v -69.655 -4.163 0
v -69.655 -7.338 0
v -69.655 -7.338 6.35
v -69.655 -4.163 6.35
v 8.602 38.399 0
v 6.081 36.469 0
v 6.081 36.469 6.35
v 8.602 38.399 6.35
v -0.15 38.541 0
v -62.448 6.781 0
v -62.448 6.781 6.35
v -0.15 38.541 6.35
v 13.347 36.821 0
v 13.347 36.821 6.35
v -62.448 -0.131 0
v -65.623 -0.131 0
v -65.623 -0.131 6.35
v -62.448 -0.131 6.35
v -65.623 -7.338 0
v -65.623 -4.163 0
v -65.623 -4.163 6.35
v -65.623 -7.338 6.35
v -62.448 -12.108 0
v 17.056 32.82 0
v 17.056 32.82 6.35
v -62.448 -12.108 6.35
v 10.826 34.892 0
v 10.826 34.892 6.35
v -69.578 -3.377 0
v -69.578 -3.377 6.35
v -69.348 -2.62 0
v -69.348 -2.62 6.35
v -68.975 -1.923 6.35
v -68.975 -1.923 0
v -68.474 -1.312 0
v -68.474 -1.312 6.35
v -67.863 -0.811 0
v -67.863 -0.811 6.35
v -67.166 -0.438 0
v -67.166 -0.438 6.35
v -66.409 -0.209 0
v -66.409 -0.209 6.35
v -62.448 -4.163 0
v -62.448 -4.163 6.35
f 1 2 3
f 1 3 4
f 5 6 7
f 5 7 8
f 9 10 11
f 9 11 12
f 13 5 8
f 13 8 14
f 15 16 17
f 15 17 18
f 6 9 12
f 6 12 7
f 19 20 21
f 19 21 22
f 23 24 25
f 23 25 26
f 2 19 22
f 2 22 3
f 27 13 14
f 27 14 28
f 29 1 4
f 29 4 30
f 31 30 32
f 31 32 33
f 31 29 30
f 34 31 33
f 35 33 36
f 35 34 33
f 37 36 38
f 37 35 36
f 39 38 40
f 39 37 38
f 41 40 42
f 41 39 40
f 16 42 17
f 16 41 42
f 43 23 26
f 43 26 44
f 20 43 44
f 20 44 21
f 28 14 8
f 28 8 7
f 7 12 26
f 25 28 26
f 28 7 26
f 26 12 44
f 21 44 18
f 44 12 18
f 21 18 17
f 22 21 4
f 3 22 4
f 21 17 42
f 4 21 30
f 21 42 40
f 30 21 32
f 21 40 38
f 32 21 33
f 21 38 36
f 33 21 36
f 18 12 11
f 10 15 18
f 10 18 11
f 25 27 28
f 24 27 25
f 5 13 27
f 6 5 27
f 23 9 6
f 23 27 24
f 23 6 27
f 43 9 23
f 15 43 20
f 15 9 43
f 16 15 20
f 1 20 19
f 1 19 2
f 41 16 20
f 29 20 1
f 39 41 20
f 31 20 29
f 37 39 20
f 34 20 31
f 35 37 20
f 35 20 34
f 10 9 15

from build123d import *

# Parameters (mm, degrees)
BOSS_EXTRUDE1_DEPTH = 6.35


with BuildPart() as part:
    # Sketch2 → Boss-Extrude1 (new body)
    with BuildSketch(Plane.XY):
        with BuildLine():
            Line((-0.14988496, 38.540888918), (6.080919163, 36.469296285))
            Line((6.080919163, 36.469296285), (8.602283556, 38.398893807))
            Line((8.602283556, 38.398893807), (13.346918999, 36.821416544))
            Line((13.346918999, 36.821416544), (10.825554606, 34.891819022))
            Line((10.825554606, 34.891819022), (17.056358729, 32.820226388))
            Line((17.056358729, 32.820226388), (-62.447694199, -12.10770477))
            Line((-62.447694199, -12.10770477), (-62.447694199, -4.16341339))
            Line((-62.447694199, -4.16341339), (-65.622694199, -4.16341339))
            Line((-65.622694199, -4.16341339), (-65.622694199, -7.33841339))
            Line((-65.622694199, -7.33841339), (-69.654994999, -7.33841339))
            Line((-69.654994999, -7.33841339), (-69.654994999, -4.16341339))
            ThreePointArc((-69.654994999, -4.16341339), (-68.473961439, -1.312146151), (-65.622694199, -0.13111259))
            Line((-65.622694199, -0.13111259), (-62.447694199, -0.13111259))
            Line((-62.447694199, -0.13111259), (-62.447694199, 6.780877989))
            Line((-62.447694199, 6.780877989), (-0.14988496, 38.540888918))
        make_face()
    extrude(amount=BOSS_EXTRUDE1_DEPTH)


solid = part.part
